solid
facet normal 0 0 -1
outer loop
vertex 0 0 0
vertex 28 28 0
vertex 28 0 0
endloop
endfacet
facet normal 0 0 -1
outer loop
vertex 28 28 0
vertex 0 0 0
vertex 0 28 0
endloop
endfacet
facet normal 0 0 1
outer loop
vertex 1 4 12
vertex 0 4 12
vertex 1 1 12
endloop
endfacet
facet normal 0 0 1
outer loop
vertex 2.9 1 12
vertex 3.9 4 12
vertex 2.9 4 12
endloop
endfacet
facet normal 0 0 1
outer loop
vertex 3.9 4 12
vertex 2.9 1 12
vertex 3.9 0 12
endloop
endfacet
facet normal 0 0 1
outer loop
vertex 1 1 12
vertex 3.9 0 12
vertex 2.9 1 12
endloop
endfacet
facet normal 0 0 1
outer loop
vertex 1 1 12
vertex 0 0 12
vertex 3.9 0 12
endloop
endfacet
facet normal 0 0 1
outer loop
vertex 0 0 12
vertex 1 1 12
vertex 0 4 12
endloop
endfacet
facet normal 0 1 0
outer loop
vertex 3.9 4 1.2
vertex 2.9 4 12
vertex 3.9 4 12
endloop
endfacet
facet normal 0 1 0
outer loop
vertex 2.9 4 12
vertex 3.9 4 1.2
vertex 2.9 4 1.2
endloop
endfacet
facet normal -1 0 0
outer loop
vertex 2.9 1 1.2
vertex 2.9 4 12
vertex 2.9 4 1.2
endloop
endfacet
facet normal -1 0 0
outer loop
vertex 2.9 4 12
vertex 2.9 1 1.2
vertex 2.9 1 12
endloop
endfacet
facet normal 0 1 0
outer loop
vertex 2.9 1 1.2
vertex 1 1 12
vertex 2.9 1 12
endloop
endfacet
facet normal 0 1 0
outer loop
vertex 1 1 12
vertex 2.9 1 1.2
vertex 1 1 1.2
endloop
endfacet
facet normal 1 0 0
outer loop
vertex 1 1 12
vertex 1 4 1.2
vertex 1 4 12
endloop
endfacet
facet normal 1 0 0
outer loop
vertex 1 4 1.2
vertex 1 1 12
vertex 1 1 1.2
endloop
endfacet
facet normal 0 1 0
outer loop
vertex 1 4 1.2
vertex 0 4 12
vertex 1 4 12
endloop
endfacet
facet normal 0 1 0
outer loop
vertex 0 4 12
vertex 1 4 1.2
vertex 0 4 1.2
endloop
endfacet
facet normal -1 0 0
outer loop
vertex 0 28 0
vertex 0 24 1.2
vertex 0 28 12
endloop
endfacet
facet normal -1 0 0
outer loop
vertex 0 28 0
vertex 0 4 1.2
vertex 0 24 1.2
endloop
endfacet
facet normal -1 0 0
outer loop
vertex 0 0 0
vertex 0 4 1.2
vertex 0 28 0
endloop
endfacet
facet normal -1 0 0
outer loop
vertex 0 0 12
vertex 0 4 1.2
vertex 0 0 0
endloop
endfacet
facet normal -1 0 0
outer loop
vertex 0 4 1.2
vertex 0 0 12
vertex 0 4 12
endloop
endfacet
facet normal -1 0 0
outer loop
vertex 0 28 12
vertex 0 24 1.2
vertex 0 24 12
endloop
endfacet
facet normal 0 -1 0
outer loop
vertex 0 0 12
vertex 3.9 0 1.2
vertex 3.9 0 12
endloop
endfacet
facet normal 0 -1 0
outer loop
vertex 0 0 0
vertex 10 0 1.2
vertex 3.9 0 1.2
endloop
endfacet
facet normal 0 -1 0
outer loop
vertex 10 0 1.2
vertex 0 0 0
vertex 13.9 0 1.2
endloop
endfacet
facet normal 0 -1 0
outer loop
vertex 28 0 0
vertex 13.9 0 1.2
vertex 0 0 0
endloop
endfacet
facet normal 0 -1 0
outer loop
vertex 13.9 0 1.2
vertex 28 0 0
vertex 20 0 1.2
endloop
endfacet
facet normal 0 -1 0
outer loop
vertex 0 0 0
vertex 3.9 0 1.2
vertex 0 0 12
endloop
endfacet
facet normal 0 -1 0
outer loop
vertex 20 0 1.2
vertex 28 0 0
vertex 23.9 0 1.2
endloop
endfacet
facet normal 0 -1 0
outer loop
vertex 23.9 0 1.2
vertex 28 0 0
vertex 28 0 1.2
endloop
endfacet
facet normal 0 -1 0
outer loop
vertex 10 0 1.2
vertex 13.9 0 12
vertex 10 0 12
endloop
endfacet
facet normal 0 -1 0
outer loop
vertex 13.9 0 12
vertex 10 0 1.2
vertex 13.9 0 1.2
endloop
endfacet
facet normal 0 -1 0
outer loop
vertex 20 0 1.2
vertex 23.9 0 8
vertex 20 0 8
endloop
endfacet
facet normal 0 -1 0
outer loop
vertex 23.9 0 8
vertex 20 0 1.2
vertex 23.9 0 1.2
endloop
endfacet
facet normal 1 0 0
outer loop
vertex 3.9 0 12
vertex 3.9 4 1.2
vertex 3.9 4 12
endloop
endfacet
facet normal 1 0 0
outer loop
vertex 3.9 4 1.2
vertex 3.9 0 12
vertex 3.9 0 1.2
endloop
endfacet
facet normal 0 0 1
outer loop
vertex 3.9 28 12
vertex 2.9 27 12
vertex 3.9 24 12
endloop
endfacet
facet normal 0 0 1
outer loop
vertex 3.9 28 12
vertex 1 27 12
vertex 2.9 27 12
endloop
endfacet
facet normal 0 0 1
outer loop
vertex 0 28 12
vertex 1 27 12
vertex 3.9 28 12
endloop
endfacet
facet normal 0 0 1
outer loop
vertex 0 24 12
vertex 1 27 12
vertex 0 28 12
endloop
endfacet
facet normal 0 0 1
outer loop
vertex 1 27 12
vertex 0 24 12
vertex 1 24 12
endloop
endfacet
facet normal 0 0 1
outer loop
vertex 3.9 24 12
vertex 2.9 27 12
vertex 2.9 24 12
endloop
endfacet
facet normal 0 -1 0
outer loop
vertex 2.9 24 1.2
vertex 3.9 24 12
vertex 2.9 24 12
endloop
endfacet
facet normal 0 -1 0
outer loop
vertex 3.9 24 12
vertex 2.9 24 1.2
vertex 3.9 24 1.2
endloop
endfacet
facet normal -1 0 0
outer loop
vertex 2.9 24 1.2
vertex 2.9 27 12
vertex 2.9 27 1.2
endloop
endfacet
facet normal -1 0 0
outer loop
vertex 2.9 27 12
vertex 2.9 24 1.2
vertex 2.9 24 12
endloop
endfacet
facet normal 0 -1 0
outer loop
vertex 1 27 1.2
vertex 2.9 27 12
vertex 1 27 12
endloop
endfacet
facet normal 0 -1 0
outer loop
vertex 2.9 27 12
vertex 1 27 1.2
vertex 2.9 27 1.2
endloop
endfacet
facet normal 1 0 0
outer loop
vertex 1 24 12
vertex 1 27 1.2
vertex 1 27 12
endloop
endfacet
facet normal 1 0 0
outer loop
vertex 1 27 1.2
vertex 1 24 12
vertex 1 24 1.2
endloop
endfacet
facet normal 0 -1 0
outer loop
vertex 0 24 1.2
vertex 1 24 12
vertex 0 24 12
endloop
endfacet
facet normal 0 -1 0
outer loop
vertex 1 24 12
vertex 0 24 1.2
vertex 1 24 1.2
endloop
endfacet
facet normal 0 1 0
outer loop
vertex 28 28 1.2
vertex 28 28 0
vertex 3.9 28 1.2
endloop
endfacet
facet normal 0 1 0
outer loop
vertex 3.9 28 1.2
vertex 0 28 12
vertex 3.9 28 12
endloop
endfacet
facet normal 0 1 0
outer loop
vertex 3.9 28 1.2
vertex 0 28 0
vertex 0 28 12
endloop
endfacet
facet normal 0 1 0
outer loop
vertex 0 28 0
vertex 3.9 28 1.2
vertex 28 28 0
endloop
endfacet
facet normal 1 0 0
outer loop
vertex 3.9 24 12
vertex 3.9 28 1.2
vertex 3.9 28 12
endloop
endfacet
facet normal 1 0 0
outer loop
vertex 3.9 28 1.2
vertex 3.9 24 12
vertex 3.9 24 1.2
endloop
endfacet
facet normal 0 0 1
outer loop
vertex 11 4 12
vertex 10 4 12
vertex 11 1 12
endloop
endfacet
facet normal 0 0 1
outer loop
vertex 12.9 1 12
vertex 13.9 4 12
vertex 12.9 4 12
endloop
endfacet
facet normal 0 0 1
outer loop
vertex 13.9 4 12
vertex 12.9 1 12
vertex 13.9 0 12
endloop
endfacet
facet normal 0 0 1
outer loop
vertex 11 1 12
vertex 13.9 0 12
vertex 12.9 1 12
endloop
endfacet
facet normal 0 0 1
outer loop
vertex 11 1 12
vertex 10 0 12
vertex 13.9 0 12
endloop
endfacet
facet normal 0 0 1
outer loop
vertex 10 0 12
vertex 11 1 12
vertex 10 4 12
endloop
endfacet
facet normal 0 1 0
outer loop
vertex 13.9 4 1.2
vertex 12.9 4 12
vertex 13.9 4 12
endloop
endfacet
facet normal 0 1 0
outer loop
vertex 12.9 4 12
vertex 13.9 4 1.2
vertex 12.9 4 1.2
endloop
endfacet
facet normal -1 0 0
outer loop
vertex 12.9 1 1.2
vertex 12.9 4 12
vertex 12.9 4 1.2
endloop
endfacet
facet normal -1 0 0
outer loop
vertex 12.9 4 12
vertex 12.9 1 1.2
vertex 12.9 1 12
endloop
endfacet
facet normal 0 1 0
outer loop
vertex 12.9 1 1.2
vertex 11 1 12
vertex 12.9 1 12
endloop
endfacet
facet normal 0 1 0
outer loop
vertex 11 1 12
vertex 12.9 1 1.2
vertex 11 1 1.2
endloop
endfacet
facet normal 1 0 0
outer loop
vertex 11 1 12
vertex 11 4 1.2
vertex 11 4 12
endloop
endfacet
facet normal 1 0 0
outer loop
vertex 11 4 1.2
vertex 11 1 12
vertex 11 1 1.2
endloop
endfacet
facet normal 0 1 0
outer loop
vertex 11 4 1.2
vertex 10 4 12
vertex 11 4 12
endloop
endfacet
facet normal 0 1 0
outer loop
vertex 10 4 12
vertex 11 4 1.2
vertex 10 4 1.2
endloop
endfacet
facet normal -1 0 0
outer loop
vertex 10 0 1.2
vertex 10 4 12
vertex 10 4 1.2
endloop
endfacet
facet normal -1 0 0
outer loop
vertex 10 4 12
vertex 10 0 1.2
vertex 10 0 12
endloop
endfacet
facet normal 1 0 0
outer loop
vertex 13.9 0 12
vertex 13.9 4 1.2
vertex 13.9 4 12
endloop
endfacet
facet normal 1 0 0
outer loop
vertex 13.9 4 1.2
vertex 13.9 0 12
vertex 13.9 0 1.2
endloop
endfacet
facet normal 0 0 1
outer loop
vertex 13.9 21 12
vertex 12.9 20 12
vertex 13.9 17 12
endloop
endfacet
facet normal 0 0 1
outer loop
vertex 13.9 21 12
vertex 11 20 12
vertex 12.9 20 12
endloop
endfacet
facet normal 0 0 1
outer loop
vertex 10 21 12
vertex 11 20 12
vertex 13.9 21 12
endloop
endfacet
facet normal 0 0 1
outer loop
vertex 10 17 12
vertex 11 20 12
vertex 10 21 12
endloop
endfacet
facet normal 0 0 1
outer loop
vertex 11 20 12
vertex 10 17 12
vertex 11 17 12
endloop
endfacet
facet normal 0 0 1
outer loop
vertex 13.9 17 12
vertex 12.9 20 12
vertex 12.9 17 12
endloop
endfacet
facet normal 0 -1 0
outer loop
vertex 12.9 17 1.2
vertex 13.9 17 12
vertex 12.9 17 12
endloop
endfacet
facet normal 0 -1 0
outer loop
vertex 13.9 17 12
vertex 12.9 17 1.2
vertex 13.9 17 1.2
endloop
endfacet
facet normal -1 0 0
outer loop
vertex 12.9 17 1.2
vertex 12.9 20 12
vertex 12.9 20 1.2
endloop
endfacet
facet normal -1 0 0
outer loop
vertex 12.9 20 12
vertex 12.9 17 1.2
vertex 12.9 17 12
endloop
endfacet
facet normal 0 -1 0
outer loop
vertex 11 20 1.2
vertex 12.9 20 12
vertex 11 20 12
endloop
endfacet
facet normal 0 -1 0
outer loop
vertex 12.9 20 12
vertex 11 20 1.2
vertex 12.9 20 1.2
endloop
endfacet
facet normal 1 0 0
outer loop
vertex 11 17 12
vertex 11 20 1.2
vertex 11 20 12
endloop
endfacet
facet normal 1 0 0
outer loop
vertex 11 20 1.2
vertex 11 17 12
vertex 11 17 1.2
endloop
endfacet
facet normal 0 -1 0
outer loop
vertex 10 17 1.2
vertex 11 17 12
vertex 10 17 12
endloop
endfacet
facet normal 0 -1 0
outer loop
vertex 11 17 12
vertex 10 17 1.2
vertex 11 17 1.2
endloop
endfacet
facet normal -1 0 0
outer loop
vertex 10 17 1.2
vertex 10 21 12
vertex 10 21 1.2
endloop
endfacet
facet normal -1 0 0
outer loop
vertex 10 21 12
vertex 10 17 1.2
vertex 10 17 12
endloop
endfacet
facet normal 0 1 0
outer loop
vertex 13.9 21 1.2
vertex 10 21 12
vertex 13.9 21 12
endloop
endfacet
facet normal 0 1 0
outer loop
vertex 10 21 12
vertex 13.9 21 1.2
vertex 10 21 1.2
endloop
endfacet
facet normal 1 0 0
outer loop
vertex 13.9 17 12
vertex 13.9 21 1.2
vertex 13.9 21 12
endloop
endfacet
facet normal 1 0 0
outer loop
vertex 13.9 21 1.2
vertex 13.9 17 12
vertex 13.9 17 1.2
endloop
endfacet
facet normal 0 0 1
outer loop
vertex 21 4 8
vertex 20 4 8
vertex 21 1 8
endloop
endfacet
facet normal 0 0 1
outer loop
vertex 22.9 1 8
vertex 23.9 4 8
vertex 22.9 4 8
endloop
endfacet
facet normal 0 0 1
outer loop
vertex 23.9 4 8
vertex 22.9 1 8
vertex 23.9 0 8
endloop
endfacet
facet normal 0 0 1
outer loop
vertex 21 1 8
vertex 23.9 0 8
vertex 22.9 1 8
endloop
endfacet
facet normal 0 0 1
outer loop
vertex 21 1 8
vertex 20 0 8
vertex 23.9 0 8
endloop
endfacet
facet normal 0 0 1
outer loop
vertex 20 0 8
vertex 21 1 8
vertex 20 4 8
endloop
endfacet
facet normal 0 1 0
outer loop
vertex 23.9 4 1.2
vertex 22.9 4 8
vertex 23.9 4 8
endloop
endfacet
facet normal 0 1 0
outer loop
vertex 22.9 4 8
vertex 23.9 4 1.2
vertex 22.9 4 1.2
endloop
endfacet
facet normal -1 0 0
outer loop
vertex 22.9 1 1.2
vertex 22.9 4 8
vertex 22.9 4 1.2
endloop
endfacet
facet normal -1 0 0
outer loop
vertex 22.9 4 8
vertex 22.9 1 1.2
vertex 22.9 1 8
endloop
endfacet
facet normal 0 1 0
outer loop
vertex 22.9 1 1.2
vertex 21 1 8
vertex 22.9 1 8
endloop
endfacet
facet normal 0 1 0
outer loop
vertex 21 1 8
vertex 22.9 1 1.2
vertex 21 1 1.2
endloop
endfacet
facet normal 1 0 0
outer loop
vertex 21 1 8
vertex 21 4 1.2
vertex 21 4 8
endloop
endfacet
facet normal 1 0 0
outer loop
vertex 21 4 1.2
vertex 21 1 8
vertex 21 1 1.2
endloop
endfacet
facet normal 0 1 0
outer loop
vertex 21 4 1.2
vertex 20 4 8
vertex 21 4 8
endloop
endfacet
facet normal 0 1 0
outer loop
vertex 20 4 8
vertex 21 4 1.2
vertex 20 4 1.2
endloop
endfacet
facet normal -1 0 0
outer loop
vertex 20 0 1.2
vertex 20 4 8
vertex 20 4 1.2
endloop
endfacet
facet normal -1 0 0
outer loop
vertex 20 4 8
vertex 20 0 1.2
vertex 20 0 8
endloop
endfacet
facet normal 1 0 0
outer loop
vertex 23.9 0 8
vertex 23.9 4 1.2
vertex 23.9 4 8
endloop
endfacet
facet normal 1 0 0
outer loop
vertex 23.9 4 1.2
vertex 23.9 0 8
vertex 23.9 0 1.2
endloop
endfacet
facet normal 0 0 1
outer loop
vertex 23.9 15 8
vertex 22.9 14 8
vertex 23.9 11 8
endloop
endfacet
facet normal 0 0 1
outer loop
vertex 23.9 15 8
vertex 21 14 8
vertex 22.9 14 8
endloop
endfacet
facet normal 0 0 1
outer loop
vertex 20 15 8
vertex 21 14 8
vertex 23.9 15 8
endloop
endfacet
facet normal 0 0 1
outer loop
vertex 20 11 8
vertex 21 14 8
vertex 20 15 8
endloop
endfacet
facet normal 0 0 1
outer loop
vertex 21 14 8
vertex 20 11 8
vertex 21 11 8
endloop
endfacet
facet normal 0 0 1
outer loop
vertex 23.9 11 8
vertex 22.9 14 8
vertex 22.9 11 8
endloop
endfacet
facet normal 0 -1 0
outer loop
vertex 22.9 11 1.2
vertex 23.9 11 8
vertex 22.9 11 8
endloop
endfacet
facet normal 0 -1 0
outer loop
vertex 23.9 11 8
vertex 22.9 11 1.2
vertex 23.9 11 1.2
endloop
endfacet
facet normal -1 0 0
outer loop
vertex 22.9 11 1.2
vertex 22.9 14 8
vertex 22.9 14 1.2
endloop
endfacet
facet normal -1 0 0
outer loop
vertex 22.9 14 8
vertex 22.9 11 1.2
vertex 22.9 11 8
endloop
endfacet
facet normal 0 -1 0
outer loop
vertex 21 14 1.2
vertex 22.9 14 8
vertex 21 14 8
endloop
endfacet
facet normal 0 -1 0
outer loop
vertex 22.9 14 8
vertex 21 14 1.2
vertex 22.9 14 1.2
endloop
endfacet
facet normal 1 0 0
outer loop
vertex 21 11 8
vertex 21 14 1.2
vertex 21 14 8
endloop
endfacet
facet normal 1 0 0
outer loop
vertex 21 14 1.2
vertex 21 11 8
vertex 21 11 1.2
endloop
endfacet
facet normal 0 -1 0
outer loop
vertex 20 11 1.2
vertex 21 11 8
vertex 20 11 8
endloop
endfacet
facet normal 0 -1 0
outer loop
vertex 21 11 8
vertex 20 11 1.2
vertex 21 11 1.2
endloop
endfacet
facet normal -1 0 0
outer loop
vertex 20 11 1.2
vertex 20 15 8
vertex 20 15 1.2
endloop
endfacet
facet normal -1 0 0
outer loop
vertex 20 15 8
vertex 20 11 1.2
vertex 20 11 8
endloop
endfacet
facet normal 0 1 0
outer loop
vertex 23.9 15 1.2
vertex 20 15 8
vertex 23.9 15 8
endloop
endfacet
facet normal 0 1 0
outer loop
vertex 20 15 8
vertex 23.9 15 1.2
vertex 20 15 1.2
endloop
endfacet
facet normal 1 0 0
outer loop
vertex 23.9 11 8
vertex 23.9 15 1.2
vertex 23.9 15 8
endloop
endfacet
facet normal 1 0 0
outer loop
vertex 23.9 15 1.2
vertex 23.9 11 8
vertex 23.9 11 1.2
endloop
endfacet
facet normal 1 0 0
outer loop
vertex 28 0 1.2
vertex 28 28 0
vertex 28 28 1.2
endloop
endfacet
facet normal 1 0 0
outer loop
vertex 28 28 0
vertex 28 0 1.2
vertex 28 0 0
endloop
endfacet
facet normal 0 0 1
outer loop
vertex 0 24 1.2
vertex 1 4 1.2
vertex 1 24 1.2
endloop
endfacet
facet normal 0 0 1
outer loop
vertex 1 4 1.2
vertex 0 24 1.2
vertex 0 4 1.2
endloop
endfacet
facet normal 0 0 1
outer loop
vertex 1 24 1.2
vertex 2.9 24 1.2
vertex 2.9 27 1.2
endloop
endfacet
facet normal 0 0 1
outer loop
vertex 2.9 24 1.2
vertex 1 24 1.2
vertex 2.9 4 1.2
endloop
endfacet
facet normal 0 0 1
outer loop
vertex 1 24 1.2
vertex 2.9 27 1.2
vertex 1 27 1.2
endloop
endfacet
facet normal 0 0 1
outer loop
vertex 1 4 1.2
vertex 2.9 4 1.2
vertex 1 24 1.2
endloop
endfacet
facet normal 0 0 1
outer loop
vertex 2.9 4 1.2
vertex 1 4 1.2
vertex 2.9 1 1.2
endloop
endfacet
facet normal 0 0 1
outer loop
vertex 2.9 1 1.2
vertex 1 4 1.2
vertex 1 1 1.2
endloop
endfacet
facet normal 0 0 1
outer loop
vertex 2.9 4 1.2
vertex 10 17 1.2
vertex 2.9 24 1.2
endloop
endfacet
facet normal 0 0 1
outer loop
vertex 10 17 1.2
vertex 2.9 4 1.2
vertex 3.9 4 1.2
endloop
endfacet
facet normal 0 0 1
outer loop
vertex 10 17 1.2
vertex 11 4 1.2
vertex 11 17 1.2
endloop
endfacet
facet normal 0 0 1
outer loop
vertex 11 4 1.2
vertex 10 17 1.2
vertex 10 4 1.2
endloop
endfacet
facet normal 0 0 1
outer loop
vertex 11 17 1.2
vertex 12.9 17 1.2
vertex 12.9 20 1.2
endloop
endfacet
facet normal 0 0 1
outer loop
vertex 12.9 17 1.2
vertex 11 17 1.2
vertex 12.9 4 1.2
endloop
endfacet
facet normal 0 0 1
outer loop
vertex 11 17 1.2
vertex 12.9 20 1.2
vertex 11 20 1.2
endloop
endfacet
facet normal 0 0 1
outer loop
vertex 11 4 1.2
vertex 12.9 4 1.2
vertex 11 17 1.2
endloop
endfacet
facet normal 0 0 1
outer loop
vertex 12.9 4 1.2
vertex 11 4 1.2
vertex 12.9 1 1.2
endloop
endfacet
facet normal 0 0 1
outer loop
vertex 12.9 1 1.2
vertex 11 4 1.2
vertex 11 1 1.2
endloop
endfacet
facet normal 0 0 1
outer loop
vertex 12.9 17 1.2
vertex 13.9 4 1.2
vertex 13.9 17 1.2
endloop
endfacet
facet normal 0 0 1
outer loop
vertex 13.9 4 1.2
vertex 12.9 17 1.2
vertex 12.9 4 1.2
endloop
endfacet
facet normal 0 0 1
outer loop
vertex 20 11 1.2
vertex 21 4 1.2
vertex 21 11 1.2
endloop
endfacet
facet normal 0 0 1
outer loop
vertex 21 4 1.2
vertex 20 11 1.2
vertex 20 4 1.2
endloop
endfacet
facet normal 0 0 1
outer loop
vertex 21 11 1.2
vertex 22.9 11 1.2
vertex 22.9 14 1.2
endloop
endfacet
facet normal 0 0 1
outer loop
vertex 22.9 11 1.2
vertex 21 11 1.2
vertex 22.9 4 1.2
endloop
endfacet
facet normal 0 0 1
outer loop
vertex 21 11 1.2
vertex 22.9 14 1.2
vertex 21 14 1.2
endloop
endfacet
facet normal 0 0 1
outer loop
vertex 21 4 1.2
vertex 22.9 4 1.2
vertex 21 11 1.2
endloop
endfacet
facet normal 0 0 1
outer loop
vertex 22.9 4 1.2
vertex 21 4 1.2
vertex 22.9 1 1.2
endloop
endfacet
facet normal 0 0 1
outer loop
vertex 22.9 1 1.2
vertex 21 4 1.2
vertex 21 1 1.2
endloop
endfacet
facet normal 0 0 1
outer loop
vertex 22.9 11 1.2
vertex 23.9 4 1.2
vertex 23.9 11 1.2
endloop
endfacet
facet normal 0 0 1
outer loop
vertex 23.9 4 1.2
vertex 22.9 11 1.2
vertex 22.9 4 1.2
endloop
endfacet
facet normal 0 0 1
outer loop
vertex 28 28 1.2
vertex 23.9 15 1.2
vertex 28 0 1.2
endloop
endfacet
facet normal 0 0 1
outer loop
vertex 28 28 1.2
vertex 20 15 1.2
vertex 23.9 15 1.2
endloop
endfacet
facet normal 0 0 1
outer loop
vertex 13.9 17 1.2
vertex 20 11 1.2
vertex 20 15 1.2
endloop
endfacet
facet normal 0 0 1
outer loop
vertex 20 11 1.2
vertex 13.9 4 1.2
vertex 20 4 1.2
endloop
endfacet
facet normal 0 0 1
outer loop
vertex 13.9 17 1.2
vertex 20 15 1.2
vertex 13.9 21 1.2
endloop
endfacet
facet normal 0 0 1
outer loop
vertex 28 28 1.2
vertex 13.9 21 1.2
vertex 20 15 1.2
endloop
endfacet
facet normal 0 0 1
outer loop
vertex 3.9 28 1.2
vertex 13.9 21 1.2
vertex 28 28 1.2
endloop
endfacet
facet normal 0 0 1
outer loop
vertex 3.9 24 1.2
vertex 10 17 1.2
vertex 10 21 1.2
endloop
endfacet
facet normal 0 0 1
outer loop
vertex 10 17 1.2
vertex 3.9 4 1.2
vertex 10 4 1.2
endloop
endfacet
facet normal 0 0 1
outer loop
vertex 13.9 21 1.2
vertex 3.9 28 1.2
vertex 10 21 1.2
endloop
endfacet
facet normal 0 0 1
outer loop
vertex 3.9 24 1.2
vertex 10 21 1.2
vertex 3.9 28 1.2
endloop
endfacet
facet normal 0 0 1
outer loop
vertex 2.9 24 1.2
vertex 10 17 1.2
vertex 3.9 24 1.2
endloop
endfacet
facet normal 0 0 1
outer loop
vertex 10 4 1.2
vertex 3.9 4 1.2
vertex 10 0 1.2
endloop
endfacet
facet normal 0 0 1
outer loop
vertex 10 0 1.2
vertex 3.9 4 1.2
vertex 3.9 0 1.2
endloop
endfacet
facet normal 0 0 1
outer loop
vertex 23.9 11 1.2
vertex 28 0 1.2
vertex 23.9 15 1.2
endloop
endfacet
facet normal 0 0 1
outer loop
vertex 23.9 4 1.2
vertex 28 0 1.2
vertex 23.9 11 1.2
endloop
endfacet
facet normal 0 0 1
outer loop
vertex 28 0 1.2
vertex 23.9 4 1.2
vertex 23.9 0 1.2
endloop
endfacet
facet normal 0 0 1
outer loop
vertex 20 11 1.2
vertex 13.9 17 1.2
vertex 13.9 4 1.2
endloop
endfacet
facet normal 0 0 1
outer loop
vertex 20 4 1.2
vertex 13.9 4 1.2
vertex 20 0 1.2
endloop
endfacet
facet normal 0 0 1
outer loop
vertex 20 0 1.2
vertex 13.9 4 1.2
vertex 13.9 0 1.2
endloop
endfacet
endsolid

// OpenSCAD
plate_width = 28.0;
plate_length = 28.0;
bottom_plate_height = 1.2;

controller_width = 25.0;
esp32_width = 18.0;
vreg_width = 12.0;

// 2D cross-section of the U-channel (in the X-Z plane as drawn,
// gets extruded upward along Y by linear_extrude)
module pcb_edge_profile(
    pcb_thickness  = 1.6,   // board thickness
    clearance      = 0.3,   // extra gap for fit tolerance
    wall_thickness = 3,     // thickness of the base and side walls
    wall_height    = 6      // height of the side walls above the base
) {
    inner_gap   = pcb_thickness + clearance;
    outer_width = inner_gap + 2*wall_thickness;
    outer_height= wall_height + wall_thickness;

    difference() {
        // outer U block
        square([outer_width, outer_height]);

        // inner slot: open at the top, closed at the bottom by wall_thickness
        translate([wall_thickness, wall_thickness])
            square([inner_gap, wall_height + 1]);
    }
}

// Extrude the profile along the length of the edge to be held
module pcb_edge_holder(
    pcb_thickness  = 1.6,
    clearance      = 0.3,
    wall_thickness = 3,
    wall_height    = 6,
    length         = 40     // how much of the edge the holder spans
) {
    linear_extrude(height = length)
        pcb_edge_profile(
            pcb_thickness  = pcb_thickness,
            clearance      = clearance,
            wall_thickness = wall_thickness,
            wall_height    = wall_height
        );
}

// Places a holder on each side of the board: one as-is (slot opening
// upward, +Y), one mirrored so its slot opens downward (-Y) to face
// the first. `board_width` is the distance between the two edges of
// the PCB — i.e. how far apart the two "seated" positions (where each
// edge bottoms out in its slot) should be.
//
// Note: the slot's opening direction is Y, not X — X is just the
// board-thickness gap, which is symmetric, so mirroring on X (as in
// an earlier version of this file) had no real effect. Mirroring on
// Y is what actually flips the opening to face the other holder.
module pcb_edge_holder_pair(
    pcb_thickness  = 1.6,
    clearance      = 0.3,
    wall_thickness = 3,
    wall_height    = 6,
    length         = 40,
    board_width    = 60     // distance between the two held edges
) {
    // bottom holder: base at y=0..wall_thickness, slot opens upward,
    // board's edge bottoms out at y = wall_thickness
    pcb_edge_holder(
        pcb_thickness  = pcb_thickness,
        clearance      = clearance,
        wall_thickness = wall_thickness,
        wall_height    = wall_height,
        length         = length
    );

    // top holder: mirrored on Y so its slot opens downward, then
    // shifted up so its "seated" position sits `board_width` above
    // the bottom holder's seated position
    translate([0, board_width + 2*wall_thickness, 0])
        mirror([0, 1, 0])
            pcb_edge_holder(
                pcb_thickness  = pcb_thickness,
                clearance      = clearance,
                wall_thickness = wall_thickness,
                wall_height    = wall_height,
                length         = length
            );
}

union(){
    cube([plate_width, plate_length, bottom_plate_height]);
    wall_height = 2.0;
    mount_length = 7;
    clearance = 0.2;
    
    // Motor Controller
    pcb_edge_holder_pair(board_width = controller_width+1, wall_thickness = 1, wall_height = 3, length = 12);
    
    // ESP32 Controller
    translate([10, 0, 0])
    pcb_edge_holder_pair(board_width = esp32_width+1, wall_thickness = 1, wall_height = 3, length = 12);
    
    // VREG Controller
    translate([20, 0, 0])
    pcb_edge_holder_pair(board_width = vreg_width+1, wall_thickness = 1, wall_height = 3, length = 8);
    
}
